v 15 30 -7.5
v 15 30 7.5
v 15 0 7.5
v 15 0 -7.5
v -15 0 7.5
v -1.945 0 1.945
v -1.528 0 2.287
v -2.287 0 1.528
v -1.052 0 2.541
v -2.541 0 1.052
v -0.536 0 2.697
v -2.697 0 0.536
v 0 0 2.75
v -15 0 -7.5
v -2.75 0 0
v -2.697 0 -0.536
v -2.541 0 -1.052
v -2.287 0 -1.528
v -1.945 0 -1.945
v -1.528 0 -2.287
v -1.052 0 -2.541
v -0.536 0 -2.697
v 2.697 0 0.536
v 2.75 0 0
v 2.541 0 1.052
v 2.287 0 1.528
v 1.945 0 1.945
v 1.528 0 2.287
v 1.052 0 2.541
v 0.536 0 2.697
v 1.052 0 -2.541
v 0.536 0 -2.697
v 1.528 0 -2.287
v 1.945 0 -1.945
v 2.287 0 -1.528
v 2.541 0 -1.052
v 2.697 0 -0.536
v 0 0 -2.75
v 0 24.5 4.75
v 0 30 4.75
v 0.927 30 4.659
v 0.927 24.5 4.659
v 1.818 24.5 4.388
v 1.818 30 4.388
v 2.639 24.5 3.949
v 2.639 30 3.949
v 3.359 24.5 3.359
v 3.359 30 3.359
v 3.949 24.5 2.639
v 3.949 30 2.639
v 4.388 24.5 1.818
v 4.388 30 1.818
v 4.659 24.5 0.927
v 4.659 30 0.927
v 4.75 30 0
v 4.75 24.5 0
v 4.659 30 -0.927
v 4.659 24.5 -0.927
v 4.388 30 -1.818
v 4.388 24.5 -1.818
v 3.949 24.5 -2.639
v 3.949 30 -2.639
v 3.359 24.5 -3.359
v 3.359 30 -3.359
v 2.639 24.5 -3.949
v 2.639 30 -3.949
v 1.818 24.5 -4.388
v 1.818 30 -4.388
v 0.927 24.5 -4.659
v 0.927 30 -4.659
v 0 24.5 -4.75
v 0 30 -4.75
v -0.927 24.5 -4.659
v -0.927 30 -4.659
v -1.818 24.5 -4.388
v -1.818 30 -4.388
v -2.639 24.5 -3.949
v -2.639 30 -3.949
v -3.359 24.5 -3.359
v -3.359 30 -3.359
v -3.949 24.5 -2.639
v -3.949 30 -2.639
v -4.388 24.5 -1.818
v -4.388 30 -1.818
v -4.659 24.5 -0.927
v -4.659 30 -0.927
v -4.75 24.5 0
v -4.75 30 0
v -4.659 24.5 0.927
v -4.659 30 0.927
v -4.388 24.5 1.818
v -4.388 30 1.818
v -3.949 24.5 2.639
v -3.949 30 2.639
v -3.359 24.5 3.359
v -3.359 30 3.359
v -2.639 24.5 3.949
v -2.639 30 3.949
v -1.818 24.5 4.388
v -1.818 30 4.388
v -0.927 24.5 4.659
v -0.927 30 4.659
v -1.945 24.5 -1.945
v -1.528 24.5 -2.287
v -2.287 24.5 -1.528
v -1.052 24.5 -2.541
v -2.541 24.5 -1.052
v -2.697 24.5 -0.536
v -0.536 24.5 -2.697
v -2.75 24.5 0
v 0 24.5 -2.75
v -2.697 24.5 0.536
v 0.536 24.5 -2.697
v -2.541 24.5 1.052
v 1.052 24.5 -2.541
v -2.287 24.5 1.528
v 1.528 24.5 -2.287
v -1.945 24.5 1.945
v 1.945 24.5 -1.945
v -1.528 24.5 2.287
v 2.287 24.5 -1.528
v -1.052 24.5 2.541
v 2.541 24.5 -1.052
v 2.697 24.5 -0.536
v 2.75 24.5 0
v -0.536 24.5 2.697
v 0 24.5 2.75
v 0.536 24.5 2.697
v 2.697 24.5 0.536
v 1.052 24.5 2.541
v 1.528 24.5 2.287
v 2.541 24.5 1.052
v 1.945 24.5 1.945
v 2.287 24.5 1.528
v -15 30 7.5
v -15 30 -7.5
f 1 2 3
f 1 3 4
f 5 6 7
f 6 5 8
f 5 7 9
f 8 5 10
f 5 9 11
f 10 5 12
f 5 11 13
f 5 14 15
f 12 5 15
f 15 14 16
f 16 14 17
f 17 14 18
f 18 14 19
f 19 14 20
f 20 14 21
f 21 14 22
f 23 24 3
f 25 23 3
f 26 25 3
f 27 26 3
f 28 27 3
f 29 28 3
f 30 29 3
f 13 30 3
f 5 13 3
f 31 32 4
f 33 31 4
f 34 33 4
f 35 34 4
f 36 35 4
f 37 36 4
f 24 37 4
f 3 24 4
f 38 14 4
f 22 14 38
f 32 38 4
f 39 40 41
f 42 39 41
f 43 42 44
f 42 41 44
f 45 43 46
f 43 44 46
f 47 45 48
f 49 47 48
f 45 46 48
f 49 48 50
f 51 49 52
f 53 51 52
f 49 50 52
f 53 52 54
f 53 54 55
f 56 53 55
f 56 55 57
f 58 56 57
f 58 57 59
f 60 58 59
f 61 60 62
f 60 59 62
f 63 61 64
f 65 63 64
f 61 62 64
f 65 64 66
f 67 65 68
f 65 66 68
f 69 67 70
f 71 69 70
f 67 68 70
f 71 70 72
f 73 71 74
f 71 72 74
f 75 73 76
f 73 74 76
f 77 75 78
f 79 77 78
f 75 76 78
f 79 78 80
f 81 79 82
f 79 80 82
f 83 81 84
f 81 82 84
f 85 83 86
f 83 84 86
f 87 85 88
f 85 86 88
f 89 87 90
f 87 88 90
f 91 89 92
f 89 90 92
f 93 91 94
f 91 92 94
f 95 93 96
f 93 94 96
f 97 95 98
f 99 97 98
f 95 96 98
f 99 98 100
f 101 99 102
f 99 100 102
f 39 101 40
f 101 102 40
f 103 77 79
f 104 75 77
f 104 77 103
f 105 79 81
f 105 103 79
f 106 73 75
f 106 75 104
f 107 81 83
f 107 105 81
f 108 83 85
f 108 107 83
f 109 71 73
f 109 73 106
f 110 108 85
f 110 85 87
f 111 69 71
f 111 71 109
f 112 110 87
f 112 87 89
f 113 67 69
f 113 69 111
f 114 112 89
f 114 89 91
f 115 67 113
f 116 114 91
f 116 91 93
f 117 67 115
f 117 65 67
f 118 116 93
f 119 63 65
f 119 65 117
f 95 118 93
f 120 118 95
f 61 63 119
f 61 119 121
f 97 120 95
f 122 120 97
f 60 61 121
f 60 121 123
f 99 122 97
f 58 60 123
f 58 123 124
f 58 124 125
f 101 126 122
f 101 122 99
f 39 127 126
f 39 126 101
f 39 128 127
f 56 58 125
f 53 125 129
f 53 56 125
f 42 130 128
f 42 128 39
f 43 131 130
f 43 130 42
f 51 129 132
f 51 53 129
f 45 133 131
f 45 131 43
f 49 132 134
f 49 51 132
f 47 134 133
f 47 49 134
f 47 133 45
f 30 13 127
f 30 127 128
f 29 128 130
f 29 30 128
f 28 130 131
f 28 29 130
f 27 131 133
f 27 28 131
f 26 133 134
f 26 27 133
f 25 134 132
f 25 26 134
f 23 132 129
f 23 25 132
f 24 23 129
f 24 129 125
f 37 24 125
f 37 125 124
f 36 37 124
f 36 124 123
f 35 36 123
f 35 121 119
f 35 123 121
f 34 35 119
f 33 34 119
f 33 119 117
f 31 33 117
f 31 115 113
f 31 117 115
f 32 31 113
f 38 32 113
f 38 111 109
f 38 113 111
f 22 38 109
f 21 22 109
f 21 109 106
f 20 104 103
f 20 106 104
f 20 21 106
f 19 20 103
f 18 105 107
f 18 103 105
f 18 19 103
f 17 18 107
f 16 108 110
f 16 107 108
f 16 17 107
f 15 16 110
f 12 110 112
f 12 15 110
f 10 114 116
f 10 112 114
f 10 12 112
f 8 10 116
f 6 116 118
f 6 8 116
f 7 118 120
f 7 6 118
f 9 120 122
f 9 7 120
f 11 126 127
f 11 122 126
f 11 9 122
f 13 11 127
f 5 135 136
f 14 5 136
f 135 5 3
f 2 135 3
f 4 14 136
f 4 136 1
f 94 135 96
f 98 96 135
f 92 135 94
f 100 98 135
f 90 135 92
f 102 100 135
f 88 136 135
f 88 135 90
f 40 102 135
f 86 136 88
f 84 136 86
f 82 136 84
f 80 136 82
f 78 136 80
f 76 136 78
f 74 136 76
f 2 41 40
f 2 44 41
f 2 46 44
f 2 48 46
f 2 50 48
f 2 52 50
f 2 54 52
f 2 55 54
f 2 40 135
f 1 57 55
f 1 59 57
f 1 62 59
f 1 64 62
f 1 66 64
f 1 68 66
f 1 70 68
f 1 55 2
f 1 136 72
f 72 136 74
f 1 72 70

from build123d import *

# Parameters (mm, degrees)
SKETCH1_W               = 30
SKETCH1_H               = 15
BOSS_EXTRUDE1_DEPTH     = 30
CUT_EXTRUDE1_DEPTH      = 35.369317712
CUT_EXTRUDE1_DEPTH_BACK = 35.369317712
SKETCH2_R               = 2.75
SKETCH3_R               = 4.75
CUT_EXTRUDE3_DEPTH      = 5.5


with BuildPart() as part:
    # Sketch1 → Boss-Extrude1 (new body)
    with BuildSketch(Plane(origin=(0, 0, 0), x_dir=(1, 0, 0), z_dir=(0, 1, 0))):
        Rectangle(SKETCH1_W, SKETCH1_H)
    extrude(amount=BOSS_EXTRUDE1_DEPTH)

    # Sketch2 → Cut-Extrude1 (cut, two sides: drawn at the far end of the back side and taken through both)
    with BuildSketch(Plane(origin=(0, 0, 0), x_dir=(1, 0, 0), z_dir=(0, 1, 0)).offset(-CUT_EXTRUDE1_DEPTH_BACK)):
        with Locations(Location((0, 0, 0), (0, 0, 270))):
            Circle(SKETCH2_R)
    extrude(amount=CUT_EXTRUDE1_DEPTH + CUT_EXTRUDE1_DEPTH_BACK, mode=Mode.SUBTRACT)

    # Sketch3 → Cut-Extrude3 (cut)
    with BuildSketch(Plane(origin=(0, 30, 0), x_dir=(1, 0, 0), z_dir=(0, 1, 0))):
        with Locations(Location((0, 0, 0), (0, 0, 270))):
            Circle(SKETCH3_R)
    extrude(amount=-CUT_EXTRUDE3_DEPTH, mode=Mode.SUBTRACT)


solid = part.part
